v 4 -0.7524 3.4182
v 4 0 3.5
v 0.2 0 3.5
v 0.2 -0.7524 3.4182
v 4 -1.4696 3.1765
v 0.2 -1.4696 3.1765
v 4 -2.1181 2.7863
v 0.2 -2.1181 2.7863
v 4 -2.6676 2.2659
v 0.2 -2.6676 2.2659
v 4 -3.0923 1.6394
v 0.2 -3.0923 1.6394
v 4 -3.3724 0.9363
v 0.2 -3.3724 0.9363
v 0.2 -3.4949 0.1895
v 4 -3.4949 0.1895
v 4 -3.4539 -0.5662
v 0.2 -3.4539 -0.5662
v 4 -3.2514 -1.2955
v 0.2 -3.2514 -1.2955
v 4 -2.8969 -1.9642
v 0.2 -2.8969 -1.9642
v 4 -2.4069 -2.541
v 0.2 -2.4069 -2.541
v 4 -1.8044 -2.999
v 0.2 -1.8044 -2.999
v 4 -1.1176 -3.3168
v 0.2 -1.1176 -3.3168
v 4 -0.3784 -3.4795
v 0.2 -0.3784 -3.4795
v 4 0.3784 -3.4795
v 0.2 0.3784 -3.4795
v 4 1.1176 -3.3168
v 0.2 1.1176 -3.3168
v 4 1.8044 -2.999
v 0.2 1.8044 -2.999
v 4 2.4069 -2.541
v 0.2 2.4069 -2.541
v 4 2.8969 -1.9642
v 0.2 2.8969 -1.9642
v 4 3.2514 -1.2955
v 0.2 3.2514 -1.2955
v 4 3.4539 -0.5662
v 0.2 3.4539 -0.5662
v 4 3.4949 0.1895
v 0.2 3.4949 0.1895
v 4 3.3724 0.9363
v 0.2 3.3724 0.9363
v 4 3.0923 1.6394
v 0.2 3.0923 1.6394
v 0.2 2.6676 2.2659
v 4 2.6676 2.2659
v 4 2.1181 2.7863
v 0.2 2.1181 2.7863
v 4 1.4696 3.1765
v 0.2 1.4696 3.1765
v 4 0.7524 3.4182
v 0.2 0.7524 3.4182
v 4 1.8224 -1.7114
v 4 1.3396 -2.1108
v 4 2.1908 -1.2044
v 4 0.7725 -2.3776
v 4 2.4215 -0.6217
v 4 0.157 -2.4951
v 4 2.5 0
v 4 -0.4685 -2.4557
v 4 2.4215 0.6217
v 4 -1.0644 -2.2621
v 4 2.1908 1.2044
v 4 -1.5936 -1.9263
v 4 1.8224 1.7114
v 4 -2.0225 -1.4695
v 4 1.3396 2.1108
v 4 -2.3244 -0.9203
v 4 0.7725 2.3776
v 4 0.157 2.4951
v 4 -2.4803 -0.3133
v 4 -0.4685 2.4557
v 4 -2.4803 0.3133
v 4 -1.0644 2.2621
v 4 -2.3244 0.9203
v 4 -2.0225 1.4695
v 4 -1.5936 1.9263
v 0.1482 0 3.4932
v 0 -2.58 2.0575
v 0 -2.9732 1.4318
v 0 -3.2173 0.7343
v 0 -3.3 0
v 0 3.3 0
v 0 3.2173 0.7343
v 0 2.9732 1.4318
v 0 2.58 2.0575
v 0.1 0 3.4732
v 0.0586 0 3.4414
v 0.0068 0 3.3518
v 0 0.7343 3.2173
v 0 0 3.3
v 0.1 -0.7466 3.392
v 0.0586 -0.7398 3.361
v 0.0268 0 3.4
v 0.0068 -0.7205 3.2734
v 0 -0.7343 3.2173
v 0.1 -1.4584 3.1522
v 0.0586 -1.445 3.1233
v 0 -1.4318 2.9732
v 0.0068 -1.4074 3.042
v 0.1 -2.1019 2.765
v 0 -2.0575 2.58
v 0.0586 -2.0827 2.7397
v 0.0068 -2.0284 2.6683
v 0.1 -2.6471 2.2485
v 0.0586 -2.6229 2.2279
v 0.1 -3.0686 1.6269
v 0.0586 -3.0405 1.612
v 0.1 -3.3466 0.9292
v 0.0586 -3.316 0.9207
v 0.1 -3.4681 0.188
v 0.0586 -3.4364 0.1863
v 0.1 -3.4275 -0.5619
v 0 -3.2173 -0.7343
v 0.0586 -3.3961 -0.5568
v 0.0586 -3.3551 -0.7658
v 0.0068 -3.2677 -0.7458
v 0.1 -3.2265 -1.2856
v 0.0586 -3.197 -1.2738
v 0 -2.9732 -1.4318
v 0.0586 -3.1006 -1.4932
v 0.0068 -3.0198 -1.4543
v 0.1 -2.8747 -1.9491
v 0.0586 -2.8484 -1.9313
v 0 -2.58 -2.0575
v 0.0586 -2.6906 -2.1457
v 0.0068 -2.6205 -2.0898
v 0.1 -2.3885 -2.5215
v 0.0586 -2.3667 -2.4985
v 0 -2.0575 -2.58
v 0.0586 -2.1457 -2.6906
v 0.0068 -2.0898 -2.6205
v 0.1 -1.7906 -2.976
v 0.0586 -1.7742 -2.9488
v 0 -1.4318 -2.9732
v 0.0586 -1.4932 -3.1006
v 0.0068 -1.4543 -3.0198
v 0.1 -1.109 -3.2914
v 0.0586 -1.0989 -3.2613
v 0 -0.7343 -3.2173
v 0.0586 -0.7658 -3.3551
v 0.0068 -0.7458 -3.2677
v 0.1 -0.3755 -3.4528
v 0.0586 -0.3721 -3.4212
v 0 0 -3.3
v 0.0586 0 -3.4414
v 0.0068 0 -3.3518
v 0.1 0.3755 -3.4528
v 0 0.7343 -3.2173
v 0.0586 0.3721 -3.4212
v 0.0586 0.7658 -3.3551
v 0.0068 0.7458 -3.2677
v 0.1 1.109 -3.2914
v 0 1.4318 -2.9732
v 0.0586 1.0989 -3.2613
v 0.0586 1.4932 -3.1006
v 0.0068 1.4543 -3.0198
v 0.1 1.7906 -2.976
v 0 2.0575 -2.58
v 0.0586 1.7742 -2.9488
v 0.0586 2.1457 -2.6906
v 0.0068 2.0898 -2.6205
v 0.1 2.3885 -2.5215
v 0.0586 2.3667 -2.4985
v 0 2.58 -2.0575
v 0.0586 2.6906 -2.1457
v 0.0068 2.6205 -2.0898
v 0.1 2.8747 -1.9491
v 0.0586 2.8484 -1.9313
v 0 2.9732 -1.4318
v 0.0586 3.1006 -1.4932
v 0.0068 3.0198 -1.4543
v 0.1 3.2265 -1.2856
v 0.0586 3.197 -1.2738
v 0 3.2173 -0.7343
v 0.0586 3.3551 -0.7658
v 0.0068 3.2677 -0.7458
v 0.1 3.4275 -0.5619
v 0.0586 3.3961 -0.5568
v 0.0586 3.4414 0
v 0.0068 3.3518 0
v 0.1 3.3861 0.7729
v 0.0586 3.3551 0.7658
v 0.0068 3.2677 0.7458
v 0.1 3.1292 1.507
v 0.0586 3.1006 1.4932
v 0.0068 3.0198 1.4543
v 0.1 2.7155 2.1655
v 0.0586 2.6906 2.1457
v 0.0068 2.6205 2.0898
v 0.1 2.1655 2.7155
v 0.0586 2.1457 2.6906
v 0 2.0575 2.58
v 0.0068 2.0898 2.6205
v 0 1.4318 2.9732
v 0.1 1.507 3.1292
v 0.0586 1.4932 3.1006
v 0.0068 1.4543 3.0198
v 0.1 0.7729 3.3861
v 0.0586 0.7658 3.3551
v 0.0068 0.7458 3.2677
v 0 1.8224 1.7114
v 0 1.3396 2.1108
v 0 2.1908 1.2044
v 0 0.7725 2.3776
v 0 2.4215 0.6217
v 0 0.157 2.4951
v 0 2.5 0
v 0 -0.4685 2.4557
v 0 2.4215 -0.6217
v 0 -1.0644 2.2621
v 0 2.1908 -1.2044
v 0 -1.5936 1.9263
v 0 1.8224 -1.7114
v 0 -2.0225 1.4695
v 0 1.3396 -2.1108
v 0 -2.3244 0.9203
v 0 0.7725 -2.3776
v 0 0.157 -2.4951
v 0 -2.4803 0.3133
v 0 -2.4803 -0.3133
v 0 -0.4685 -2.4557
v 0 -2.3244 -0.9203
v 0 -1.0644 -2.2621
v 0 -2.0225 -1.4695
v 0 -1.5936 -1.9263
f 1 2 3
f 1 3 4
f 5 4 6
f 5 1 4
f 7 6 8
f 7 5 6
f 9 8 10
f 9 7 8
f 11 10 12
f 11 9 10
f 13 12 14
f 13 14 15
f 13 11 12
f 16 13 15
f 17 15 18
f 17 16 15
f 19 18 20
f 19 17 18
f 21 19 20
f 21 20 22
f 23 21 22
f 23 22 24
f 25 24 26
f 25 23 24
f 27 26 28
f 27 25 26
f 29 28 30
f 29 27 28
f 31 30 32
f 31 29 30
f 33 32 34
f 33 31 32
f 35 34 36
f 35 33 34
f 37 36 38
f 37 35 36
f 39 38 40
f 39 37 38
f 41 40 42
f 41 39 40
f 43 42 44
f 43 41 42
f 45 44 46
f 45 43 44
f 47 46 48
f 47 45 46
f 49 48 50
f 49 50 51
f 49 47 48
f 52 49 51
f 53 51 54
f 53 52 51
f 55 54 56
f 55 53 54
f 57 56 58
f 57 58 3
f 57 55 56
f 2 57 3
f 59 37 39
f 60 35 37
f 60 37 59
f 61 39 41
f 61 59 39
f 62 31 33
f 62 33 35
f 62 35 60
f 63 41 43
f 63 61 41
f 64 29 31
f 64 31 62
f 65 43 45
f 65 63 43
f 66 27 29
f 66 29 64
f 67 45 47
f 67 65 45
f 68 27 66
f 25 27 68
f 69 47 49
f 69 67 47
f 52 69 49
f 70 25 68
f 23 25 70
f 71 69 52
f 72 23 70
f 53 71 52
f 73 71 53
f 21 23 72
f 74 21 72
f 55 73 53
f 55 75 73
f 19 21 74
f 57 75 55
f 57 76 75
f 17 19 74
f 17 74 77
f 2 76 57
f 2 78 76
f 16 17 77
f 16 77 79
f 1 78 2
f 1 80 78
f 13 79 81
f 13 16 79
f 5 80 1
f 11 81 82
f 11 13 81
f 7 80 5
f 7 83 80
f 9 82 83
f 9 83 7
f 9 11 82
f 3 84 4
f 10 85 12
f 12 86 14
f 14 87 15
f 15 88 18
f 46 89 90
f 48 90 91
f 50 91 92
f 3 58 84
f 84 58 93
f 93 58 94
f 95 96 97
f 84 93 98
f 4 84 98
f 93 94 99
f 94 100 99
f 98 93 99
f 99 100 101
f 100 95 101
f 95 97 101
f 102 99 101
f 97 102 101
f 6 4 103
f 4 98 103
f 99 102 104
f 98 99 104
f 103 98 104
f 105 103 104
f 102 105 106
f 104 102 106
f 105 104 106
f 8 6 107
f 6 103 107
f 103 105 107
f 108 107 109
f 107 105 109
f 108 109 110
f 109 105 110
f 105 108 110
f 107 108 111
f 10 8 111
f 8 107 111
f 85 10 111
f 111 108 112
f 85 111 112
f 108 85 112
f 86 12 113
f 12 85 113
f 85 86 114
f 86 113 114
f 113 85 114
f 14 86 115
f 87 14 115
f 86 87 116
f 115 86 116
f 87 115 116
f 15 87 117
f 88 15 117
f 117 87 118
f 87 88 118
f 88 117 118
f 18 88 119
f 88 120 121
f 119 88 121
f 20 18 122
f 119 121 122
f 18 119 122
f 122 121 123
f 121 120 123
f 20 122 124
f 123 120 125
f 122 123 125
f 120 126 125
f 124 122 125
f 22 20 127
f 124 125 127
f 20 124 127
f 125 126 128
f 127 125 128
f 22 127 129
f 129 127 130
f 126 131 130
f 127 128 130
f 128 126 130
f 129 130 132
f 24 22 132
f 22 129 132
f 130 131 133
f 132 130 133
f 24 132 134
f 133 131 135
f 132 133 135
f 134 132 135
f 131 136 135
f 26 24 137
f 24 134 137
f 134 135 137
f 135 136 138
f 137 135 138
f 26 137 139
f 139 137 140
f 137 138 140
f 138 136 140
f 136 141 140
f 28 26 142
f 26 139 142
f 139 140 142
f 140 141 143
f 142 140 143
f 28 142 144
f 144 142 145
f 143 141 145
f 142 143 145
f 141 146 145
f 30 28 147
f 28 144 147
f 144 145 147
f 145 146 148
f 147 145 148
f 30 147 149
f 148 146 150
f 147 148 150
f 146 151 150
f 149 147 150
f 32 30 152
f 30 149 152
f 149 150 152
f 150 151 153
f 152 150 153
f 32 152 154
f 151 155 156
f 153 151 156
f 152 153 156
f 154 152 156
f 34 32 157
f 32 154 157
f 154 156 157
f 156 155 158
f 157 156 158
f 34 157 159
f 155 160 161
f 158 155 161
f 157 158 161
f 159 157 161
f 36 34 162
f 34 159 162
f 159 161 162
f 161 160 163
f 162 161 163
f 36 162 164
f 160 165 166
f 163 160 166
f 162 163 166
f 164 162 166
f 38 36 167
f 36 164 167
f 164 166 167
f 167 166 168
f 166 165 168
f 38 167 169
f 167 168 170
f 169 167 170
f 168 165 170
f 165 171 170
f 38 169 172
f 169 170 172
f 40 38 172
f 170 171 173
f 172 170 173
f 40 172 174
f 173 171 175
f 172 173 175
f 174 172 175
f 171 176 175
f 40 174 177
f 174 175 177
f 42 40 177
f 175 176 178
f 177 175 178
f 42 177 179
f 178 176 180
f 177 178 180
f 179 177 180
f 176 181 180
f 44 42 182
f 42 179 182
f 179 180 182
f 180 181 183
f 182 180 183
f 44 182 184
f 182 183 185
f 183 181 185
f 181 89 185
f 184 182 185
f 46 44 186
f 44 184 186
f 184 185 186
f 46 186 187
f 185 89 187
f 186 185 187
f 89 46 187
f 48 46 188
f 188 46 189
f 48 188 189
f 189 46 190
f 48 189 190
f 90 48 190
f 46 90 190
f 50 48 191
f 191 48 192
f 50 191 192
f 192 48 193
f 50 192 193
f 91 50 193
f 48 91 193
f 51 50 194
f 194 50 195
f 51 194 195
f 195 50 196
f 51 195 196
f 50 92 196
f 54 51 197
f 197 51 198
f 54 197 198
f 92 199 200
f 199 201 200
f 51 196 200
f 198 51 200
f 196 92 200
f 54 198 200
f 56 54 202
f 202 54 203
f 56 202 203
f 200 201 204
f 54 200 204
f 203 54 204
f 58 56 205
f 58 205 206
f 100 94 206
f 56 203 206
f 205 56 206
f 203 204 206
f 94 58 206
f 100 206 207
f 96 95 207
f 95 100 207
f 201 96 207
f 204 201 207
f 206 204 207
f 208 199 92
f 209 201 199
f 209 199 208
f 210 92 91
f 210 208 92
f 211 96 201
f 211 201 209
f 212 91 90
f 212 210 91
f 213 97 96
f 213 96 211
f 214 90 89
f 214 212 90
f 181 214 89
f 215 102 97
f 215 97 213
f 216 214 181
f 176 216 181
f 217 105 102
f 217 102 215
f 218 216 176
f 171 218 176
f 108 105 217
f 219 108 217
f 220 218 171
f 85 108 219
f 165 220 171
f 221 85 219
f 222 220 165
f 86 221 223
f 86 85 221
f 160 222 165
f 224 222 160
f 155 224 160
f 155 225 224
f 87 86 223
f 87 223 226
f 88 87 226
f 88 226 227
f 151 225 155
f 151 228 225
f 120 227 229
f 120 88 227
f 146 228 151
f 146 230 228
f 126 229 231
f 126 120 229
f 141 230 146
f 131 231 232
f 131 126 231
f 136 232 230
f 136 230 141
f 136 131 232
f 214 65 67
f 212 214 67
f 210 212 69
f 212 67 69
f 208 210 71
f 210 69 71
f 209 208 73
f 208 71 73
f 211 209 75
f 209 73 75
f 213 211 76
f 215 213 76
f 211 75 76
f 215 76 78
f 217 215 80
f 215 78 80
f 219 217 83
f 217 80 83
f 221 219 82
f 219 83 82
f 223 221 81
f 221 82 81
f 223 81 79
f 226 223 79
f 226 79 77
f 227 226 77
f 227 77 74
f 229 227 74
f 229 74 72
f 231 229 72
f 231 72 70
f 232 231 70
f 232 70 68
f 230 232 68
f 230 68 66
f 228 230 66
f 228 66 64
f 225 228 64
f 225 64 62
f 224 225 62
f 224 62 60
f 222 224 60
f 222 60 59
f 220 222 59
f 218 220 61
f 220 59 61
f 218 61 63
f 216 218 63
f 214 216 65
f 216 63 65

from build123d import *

# Parameters (mm, degrees)
FILLET1_R          = 0.2
FILLET2_R          = 0.2
HEX_2_DEPTH        = 2
SKETCH4_R          = 2.5
CUT_EXTRUDE1_DEPTH = 85.712469332
SKETCH9_R          = 2.5
CUT_EXTRUDE6_DEPTH = 353.231631037


with BuildPart() as part:
    # BodySke → Base-Revolve (revolve)
    with BuildSketch(Plane.XY, mode=Mode.PRIVATE) as base_revolve_sk:
        Polygon((0, 0), (0, 3.5), (4, 3.5), (4, 2), (15.61, 2), (16, 1.61), (16, 0), align=None)
    revolve(base_revolve_sk.sketch.rotate(Axis((-31.75, 0, 0), (1, 0, 0)), 90), axis=Axis((-31.75, 0, 0), (1, 0, 0)))

    # Fillet1
    fillet1_edges = [part.edges().sort_by_distance(p)[0] for p in [
        (4, 0, -2),
    ]]
    fillet(fillet1_edges, radius=FILLET1_R)

    # Fillet2
    fillet2_edges = [part.edges().sort_by_distance(p)[0] for p in [
        (0, 0, -3.5),
    ]]
    fillet(fillet2_edges, radius=FILLET2_R)

    # Sketch2 → Hex-PreBroach (revolve, cut)
    with BuildSketch(Plane.XY, mode=Mode.PRIVATE) as hex_prebroach_sk:
        Polygon((0, 1.5355), (2, 1.5355), (2.886521338, 0), (0, 0), align=None)
    revolve(hex_prebroach_sk.sketch.rotate(Axis((0, 0, 0), (1, 0, 0)), 90), axis=Axis((0, 0, 0), (1, 0, 0)), mode=Mode.SUBTRACT)

    # Sketch3 → Hex 2 (cut)
    with BuildSketch(Plane(origin=(0, 0, 0), x_dir=(0, 0.500000000000001, 0.866025403784438), z_dir=(-1, 0, 0))):
        Polygon((0.886521338, 1.5355), (-0.886521338, 1.5355), (-1.773042677, 0), (-0.886521338, -1.5355), (0.886521338, -1.5355), (1.773042677, 0), align=None)
    extrude(amount=-HEX_2_DEPTH, mode=Mode.SUBTRACT)

    # Sketch4 → Cut-Extrude1 (cut, through all)
    with BuildSketch(Plane(origin=(4, -67.297227621, -41.443909469), x_dir=(0, 0, 1), z_dir=(-1, 0, 0))):
        with Locations((41.443909469, 67.297227621)):
            Circle(SKETCH4_R)
    extrude(amount=-CUT_EXTRUDE1_DEPTH, mode=Mode.SUBTRACT)

    # Sketch9 → Cut-Extrude6 (cut, through all)
    with BuildSketch(Plane(origin=(254, -186.360303269, -149.810753298), x_dir=(0, 0.9242245927363031, 0.3818493186865921), z_dir=(1, 0, 0))):
        with Locations(Location((229.443909469, 67.297227621, 0), (0, 0, 337.551719153))):
            Circle(SKETCH9_R)
    extrude(amount=-CUT_EXTRUDE6_DEPTH, mode=Mode.SUBTRACT)


solid = part.part
